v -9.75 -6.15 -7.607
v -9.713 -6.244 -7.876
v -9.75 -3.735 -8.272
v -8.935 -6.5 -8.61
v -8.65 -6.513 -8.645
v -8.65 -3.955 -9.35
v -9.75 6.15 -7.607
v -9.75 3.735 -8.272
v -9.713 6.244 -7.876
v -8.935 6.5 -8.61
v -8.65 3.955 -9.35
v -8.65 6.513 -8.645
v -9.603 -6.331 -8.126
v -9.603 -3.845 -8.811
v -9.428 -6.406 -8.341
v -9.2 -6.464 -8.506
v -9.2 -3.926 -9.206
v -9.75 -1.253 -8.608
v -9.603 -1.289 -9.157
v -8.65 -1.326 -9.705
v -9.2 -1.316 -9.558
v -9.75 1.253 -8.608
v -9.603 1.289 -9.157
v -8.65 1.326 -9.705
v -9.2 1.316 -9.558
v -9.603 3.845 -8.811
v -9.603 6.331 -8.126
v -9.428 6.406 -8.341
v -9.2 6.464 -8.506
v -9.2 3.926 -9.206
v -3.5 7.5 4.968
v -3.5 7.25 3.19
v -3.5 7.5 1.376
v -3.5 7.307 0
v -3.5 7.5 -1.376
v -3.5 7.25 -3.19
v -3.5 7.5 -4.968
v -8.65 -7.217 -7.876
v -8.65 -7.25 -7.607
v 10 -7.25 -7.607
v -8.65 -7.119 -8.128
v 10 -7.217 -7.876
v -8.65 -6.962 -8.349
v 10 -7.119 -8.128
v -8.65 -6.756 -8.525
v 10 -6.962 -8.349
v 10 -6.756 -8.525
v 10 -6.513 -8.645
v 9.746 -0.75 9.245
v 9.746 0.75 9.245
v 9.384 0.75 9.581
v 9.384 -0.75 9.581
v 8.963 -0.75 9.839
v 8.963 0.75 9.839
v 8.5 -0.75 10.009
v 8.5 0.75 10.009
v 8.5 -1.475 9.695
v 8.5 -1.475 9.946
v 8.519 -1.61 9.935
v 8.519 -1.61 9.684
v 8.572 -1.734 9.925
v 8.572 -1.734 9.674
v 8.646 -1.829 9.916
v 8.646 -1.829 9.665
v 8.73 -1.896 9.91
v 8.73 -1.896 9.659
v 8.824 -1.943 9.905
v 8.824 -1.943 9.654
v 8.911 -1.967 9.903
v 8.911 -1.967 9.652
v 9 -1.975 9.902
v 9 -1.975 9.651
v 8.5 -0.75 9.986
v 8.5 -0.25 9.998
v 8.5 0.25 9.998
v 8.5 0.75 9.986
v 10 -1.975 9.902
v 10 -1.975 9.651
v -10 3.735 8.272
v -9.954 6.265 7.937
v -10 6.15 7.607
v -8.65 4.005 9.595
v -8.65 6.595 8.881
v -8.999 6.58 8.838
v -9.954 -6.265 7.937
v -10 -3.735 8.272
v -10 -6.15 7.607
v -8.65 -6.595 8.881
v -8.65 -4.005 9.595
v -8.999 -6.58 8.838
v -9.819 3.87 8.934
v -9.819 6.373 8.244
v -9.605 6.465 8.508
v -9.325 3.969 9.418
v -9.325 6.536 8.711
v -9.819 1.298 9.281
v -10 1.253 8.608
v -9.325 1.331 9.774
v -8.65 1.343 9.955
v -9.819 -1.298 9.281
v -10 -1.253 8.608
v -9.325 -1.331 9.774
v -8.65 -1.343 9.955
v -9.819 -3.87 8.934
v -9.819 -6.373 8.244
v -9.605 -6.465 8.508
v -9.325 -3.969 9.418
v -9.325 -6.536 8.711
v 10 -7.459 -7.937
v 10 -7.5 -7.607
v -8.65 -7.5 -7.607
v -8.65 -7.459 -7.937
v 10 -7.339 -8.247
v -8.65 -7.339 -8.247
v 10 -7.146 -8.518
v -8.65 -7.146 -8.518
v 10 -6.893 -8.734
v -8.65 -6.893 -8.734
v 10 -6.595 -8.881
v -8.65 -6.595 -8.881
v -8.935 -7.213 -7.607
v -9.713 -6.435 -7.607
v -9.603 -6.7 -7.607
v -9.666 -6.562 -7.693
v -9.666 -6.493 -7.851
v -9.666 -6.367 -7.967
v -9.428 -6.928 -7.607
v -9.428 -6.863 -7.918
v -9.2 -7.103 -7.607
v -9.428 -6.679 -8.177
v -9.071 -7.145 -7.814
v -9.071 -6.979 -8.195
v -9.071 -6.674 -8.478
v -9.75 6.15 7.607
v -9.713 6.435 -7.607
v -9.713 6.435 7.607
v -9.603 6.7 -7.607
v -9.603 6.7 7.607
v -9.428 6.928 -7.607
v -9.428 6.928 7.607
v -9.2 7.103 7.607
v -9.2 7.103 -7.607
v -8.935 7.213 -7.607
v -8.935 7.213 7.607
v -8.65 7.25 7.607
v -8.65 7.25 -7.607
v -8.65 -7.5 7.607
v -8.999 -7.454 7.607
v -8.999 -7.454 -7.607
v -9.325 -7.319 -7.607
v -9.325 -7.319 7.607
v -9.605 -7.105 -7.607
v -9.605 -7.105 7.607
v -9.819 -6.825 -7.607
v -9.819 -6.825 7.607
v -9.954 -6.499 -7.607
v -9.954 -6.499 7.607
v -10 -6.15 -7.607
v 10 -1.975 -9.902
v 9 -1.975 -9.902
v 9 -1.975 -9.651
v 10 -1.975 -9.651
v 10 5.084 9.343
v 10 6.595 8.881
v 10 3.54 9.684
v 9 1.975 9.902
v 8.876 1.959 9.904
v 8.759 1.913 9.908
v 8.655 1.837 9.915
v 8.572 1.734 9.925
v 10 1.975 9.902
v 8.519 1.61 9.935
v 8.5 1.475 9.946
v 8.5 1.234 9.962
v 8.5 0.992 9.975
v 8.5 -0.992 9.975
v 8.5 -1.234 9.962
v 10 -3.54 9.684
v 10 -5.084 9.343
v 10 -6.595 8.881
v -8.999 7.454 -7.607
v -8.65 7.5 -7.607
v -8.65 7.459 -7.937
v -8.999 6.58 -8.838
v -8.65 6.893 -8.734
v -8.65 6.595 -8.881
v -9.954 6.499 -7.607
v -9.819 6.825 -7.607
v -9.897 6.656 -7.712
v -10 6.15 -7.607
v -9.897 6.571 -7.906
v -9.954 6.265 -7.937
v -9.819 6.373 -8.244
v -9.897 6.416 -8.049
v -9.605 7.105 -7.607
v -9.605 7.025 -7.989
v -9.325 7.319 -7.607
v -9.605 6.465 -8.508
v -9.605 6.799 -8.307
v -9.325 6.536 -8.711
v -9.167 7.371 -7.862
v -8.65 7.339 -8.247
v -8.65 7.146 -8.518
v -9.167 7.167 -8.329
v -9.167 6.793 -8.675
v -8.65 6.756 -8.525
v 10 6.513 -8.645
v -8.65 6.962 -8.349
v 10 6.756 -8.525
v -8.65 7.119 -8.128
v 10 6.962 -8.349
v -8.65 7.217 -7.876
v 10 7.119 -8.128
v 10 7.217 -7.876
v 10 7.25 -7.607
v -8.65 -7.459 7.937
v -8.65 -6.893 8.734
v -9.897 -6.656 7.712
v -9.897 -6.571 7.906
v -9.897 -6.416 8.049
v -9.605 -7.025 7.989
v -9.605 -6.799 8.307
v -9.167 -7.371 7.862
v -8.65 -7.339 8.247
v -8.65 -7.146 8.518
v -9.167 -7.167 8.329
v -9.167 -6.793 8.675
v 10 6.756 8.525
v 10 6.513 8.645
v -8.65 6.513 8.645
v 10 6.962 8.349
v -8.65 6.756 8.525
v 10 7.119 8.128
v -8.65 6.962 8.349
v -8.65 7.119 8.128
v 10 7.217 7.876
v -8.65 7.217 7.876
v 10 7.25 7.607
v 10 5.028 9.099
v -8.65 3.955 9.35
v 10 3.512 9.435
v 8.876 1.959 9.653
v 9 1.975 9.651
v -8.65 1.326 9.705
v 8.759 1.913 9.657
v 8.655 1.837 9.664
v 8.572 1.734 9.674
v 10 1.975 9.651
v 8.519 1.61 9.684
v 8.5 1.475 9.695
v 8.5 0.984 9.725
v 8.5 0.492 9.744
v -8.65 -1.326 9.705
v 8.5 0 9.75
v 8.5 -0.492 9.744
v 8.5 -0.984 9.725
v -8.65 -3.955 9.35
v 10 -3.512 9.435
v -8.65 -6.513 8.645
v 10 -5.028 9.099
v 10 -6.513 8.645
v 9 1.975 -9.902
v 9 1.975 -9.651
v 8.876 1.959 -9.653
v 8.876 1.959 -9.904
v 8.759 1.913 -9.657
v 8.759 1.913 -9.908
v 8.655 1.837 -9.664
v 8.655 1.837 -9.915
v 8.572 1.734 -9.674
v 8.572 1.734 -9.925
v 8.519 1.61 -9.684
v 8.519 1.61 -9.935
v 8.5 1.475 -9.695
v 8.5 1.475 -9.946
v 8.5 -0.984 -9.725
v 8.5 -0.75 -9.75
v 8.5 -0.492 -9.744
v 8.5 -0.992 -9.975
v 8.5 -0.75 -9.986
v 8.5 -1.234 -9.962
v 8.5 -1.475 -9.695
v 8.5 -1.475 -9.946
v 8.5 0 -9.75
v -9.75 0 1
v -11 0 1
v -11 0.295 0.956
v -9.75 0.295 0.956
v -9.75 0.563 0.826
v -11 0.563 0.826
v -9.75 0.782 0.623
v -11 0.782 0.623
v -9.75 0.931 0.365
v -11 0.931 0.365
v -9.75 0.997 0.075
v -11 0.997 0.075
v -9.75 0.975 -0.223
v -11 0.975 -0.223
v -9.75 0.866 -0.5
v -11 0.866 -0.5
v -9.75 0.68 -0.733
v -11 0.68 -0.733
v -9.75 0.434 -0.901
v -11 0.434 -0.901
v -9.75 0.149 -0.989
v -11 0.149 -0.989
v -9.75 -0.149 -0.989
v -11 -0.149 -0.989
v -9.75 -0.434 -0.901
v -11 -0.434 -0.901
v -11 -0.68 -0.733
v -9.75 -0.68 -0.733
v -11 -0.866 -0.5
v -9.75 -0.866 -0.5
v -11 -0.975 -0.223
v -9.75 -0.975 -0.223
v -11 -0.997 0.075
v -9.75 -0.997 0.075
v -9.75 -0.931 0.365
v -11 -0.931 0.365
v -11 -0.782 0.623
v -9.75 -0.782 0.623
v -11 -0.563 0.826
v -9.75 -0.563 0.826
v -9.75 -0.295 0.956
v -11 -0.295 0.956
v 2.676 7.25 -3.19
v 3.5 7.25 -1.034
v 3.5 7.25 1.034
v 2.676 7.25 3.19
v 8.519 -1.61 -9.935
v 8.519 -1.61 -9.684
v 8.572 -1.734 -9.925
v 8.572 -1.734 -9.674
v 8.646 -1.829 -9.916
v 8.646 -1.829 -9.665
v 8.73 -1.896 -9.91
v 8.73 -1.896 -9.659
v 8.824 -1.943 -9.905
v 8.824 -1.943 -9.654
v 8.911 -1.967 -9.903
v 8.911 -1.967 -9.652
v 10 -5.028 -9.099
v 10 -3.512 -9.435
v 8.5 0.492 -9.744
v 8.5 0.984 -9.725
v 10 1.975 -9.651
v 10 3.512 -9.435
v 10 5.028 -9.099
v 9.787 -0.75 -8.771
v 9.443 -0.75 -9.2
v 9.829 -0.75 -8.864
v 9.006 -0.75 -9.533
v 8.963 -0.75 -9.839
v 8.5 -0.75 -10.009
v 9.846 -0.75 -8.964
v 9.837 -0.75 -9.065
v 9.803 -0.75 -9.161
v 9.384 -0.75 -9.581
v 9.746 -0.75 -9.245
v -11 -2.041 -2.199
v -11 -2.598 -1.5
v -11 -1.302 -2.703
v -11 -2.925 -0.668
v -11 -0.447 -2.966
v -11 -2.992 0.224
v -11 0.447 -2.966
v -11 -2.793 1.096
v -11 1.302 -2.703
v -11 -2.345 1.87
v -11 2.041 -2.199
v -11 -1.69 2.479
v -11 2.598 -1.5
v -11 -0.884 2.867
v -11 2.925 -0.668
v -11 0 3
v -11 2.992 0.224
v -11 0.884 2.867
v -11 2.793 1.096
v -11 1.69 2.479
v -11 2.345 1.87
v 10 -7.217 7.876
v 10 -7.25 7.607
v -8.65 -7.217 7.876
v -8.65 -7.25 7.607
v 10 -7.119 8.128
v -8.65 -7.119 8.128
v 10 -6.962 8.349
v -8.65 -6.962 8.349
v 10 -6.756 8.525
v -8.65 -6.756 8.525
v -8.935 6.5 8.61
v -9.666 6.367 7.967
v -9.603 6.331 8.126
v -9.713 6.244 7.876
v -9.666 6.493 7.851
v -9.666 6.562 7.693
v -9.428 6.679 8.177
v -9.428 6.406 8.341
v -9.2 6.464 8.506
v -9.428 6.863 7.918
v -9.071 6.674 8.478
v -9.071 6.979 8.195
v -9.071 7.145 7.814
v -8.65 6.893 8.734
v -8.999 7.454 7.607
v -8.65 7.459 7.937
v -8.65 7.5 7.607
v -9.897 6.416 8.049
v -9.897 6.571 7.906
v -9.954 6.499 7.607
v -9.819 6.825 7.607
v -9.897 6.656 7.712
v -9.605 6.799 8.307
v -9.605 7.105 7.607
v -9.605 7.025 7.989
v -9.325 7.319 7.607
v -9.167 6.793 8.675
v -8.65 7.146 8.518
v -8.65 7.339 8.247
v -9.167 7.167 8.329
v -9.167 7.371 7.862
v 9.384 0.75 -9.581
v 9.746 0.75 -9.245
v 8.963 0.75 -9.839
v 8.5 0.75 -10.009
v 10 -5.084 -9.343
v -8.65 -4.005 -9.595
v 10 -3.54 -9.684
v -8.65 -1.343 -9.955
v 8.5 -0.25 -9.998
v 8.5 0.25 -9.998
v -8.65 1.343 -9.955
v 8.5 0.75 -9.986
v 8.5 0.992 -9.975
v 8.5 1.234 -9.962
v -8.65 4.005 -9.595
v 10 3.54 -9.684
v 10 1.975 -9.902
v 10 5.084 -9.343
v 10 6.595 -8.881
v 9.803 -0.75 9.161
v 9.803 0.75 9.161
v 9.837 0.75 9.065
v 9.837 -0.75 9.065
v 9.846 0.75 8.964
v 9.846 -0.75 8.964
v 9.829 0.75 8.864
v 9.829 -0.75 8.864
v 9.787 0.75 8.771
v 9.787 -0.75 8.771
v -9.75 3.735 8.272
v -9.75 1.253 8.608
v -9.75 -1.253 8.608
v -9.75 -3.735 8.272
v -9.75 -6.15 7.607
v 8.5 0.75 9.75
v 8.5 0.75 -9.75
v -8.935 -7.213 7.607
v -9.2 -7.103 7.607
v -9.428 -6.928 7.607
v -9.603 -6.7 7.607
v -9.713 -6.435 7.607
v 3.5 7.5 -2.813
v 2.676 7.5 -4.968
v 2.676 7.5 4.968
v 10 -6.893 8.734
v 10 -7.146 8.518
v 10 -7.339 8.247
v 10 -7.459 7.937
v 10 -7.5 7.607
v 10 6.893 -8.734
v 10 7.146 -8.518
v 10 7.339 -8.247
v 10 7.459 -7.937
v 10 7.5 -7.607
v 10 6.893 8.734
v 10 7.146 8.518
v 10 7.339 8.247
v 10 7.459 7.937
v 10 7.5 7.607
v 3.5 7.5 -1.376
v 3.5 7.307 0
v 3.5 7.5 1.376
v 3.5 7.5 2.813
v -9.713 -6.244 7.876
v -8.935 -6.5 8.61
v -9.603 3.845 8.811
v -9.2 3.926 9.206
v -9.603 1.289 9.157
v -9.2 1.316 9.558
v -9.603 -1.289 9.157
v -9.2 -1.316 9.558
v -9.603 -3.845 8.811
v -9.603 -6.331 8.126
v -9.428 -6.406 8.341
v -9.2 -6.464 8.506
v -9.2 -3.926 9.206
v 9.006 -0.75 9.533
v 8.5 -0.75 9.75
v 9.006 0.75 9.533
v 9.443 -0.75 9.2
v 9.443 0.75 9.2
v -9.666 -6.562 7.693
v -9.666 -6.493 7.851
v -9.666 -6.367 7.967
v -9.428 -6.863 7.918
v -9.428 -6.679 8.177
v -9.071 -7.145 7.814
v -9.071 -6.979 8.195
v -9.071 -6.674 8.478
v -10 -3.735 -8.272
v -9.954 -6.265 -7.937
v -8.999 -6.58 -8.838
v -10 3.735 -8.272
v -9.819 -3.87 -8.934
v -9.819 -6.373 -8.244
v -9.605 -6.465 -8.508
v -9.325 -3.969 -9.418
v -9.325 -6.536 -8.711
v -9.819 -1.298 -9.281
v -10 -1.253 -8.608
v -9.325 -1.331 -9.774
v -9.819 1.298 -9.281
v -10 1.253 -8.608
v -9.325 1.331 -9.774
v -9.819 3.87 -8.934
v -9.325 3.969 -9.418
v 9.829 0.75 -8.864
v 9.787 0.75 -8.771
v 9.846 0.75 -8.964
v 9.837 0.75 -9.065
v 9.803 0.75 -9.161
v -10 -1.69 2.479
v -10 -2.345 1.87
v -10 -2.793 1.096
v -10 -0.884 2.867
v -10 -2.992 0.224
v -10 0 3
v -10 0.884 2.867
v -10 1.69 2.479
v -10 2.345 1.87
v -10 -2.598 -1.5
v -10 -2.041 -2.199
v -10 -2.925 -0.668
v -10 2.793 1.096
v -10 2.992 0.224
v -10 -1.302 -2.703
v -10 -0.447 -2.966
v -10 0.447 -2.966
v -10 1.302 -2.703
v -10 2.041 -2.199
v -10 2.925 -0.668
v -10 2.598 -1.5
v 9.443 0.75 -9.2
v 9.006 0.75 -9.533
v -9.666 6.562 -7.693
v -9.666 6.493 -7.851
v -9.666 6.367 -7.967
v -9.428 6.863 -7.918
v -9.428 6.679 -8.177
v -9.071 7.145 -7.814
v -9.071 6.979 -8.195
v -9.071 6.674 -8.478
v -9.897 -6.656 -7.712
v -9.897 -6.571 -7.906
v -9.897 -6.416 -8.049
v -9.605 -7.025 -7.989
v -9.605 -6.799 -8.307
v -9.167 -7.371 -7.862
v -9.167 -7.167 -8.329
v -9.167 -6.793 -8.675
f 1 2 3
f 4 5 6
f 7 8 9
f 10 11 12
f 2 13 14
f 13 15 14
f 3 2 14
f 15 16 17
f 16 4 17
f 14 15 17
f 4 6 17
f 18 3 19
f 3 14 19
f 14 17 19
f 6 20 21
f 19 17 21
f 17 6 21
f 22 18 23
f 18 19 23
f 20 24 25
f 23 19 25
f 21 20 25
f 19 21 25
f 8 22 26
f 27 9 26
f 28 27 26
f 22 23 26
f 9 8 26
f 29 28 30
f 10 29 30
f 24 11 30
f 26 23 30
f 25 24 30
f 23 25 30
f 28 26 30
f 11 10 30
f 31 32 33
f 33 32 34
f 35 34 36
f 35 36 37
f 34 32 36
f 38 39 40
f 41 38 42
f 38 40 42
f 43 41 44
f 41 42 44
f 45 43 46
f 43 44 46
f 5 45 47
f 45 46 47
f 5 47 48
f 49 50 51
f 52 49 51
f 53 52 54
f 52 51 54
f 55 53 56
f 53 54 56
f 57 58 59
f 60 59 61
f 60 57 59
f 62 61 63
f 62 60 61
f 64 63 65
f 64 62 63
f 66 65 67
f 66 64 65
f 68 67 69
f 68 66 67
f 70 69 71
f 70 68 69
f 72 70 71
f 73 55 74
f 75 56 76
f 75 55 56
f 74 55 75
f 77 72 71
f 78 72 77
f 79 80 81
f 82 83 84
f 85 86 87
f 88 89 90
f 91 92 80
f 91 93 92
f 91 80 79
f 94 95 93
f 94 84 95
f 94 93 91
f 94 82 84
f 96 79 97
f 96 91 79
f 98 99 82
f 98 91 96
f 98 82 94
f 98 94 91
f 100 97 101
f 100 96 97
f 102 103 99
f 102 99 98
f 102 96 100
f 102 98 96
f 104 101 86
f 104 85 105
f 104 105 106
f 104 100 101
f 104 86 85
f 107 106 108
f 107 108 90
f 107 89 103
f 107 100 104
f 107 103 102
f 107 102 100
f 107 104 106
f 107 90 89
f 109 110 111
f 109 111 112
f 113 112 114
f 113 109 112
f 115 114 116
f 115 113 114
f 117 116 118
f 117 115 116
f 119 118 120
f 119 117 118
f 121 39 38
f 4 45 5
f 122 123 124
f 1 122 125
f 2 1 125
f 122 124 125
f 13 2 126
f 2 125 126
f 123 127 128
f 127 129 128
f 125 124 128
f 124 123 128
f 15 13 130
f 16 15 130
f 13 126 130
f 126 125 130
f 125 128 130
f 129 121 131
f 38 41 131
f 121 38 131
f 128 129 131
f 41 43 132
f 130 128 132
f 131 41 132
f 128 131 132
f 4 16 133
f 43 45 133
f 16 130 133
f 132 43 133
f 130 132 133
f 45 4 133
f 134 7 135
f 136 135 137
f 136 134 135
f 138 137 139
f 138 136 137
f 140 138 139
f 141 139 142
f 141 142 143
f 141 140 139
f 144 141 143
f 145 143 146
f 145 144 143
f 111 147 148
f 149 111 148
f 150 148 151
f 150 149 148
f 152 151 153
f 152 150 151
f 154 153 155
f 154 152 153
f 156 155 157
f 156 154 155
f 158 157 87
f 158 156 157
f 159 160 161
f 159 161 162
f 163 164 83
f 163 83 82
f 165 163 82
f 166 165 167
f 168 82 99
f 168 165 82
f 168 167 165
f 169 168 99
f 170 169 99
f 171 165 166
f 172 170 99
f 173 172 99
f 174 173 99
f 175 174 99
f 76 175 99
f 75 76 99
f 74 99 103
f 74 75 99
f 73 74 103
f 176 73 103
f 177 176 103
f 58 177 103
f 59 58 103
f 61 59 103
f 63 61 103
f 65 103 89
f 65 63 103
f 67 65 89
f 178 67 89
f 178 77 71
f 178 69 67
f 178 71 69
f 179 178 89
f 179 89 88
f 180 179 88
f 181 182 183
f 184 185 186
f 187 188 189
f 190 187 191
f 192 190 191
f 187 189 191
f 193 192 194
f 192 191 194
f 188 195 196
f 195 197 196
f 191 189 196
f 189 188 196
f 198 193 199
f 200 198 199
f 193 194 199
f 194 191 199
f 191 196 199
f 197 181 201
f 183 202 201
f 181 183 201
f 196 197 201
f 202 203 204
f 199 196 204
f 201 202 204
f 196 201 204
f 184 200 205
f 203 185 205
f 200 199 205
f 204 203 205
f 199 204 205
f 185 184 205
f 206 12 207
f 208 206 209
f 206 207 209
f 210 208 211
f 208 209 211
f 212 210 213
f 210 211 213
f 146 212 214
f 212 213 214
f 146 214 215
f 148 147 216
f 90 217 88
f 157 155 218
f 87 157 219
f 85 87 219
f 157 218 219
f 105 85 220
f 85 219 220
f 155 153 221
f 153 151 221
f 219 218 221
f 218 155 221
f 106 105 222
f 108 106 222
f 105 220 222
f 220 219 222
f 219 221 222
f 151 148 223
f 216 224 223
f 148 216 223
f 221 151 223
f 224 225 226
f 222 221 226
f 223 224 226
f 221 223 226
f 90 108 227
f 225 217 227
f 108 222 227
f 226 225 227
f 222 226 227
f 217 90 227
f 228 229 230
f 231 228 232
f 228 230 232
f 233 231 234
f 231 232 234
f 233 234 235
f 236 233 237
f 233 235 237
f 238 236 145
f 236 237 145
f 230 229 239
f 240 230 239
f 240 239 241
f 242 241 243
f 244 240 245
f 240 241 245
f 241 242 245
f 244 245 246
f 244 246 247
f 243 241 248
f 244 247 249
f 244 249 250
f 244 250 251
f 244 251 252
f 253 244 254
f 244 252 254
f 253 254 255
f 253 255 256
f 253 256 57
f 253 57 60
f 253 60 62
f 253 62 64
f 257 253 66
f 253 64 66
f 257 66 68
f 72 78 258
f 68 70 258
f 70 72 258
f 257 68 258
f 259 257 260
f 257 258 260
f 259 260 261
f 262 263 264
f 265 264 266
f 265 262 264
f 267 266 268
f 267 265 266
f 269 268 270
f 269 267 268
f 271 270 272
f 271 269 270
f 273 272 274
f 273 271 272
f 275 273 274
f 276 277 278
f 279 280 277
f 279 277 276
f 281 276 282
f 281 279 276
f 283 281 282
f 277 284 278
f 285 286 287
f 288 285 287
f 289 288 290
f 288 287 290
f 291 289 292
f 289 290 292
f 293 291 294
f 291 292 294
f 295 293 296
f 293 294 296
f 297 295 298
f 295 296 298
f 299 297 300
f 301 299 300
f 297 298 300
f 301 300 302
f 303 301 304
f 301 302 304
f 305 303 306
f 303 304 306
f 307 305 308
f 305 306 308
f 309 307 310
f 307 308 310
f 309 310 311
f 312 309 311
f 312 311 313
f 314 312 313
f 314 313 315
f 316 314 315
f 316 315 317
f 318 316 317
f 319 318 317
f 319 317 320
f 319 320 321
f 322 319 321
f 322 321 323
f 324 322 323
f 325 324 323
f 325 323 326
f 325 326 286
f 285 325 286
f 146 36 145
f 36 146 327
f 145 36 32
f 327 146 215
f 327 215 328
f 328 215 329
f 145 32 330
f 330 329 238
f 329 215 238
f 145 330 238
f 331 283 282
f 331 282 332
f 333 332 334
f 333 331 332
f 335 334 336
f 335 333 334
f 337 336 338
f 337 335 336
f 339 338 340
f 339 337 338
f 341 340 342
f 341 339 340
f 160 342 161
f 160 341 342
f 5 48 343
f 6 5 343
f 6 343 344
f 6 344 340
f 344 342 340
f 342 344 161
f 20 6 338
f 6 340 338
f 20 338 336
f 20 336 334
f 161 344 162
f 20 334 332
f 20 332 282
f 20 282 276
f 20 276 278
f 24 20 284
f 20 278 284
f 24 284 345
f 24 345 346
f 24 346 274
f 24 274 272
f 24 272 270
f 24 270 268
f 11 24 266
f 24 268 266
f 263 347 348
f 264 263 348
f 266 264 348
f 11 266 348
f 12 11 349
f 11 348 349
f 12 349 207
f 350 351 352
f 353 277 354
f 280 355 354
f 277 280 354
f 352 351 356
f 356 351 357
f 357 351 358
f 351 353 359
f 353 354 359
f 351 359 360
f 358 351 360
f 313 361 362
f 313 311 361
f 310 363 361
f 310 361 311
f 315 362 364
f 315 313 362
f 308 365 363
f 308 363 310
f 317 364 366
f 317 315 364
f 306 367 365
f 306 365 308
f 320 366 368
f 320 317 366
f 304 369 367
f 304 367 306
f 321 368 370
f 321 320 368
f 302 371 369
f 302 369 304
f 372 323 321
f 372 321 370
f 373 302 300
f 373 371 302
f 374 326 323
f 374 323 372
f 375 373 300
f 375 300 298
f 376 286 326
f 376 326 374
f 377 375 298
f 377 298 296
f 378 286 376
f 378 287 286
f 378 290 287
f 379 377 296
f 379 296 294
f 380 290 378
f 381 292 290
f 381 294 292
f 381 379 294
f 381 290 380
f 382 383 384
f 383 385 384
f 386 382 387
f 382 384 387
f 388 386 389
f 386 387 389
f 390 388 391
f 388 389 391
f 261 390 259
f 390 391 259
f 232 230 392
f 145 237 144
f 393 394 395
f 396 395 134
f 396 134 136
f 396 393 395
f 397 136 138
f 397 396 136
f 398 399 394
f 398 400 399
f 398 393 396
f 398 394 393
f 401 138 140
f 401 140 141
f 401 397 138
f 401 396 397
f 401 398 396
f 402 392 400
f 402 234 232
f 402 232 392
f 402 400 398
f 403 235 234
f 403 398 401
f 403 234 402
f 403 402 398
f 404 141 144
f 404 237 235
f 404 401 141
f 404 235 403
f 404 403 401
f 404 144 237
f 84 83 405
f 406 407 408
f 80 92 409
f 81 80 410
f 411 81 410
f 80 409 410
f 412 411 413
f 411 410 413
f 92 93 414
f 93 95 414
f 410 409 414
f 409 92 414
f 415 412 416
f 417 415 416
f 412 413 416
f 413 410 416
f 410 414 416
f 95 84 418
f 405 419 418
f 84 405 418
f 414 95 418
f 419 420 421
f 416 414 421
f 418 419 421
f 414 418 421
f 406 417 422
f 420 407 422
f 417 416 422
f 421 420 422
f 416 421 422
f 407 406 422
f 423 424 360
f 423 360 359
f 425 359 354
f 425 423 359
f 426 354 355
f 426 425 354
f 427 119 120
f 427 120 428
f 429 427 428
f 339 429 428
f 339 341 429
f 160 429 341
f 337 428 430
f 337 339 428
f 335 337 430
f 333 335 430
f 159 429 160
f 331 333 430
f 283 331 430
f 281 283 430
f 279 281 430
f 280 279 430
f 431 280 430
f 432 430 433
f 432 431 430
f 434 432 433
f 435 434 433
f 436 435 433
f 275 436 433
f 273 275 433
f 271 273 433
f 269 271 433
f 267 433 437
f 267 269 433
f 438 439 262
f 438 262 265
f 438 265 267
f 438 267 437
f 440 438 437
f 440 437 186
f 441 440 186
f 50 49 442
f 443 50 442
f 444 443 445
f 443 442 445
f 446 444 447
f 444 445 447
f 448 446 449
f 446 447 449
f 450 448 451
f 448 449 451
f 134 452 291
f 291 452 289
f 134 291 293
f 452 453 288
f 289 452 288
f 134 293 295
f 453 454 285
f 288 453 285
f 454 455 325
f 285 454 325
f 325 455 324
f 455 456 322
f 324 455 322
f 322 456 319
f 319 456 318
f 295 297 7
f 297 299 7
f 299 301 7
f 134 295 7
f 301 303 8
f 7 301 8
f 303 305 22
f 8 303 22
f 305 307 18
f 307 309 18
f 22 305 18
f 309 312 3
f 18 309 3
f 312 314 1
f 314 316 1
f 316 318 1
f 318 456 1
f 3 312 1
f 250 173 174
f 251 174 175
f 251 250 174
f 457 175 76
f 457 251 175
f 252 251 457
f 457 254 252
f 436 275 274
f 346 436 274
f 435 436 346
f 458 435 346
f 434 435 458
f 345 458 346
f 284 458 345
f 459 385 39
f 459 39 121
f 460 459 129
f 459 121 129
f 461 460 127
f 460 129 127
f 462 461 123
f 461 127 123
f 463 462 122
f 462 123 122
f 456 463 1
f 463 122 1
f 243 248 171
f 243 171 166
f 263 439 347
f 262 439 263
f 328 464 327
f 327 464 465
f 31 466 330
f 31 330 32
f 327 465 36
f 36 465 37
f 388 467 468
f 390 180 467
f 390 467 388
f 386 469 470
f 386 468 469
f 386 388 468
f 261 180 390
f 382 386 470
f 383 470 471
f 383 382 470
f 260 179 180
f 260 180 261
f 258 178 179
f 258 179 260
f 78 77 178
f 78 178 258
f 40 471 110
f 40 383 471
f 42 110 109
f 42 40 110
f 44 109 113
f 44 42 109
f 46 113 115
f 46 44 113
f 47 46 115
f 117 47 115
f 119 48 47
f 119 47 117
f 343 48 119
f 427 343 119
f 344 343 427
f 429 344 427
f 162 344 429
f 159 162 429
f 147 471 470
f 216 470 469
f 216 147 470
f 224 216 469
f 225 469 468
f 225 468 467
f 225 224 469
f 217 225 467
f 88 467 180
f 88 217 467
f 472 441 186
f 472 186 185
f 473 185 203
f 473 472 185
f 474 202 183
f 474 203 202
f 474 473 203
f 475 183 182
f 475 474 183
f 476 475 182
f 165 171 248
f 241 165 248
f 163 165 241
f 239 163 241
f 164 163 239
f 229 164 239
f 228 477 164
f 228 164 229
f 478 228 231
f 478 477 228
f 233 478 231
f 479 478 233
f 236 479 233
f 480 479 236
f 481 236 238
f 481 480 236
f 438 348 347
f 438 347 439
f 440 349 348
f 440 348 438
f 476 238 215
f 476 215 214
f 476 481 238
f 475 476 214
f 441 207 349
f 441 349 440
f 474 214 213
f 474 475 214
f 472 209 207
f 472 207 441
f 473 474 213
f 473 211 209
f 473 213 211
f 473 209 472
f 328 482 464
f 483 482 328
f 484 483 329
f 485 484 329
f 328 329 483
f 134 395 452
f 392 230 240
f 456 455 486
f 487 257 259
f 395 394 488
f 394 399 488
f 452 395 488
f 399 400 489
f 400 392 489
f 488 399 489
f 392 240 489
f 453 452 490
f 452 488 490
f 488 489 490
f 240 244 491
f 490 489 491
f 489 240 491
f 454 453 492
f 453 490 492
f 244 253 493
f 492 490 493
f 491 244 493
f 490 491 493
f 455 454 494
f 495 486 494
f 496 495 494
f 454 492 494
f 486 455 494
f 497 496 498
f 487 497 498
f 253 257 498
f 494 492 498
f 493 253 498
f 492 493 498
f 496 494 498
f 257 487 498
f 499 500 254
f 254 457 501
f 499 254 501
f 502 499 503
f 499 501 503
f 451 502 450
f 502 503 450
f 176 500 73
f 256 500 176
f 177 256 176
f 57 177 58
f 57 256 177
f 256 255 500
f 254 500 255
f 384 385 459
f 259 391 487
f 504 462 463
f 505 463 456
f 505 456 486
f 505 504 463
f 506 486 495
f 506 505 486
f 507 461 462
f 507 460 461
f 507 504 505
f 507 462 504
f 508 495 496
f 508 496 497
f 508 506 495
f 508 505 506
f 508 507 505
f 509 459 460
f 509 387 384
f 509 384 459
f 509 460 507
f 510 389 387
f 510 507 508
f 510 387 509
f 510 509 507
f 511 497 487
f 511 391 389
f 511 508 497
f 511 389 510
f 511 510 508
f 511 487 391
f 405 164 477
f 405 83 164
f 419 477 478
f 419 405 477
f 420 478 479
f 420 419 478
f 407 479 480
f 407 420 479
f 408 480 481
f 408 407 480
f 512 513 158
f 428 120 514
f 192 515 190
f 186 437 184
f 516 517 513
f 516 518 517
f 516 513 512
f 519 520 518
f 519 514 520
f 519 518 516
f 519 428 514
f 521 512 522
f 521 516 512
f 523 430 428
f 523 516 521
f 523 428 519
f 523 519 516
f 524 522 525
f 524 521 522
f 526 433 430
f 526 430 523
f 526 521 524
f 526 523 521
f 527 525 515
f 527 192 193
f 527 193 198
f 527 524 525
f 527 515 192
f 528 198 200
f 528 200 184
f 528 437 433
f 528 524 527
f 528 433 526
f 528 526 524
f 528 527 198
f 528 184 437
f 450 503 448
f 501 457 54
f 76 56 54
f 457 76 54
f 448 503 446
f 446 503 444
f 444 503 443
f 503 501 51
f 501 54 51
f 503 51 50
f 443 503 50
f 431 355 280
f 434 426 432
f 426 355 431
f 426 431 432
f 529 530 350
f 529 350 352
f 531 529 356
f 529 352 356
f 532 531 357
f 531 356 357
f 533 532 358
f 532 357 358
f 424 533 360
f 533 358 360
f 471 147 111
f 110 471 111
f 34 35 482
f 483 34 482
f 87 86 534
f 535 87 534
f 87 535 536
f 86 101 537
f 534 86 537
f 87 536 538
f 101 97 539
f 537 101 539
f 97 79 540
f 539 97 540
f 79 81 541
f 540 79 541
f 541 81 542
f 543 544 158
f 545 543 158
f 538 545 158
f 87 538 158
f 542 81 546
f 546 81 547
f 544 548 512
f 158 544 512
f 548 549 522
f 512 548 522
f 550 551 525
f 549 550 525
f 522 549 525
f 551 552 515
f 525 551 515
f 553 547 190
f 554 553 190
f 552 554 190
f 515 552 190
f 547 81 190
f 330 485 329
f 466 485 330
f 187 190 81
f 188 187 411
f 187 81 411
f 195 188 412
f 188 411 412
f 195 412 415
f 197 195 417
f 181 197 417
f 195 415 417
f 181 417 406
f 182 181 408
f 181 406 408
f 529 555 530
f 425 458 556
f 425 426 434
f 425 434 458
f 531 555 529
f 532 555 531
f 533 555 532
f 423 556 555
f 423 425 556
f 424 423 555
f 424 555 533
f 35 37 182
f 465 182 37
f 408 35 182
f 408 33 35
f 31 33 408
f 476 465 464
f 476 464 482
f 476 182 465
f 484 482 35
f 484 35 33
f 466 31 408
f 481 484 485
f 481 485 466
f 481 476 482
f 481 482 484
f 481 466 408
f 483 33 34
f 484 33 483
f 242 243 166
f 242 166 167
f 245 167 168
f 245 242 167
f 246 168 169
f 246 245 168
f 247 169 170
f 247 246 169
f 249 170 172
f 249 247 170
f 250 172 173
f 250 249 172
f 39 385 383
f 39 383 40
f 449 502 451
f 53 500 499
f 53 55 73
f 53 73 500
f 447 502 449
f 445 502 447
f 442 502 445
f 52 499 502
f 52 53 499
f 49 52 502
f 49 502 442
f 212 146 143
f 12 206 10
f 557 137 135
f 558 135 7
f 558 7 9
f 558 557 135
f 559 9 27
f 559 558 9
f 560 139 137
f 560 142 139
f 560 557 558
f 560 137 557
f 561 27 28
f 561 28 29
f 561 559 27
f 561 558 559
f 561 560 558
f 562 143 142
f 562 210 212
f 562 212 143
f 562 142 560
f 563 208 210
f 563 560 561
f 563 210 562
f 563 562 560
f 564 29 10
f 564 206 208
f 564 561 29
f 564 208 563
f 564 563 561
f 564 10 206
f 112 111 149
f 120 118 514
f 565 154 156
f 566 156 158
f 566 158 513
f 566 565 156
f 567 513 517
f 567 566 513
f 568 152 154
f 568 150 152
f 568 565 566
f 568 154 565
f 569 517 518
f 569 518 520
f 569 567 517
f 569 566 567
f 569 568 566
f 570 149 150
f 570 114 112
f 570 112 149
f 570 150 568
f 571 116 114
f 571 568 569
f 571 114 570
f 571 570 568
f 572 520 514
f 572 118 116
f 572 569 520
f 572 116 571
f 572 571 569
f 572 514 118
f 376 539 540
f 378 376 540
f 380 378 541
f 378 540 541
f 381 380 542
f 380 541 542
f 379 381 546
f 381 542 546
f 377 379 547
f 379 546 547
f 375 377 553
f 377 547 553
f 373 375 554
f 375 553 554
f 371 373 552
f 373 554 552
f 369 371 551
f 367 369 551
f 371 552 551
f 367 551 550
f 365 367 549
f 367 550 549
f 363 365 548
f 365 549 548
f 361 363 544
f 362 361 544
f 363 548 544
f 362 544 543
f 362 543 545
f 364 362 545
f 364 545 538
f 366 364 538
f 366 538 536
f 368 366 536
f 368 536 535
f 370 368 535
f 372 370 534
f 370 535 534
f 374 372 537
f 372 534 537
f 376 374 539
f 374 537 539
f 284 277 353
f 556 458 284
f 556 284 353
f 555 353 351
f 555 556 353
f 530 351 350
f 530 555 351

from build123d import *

# Parameters (mm, degrees)
BOSS_EXTRUDE1_DEPTH       = 10
SKETCH2_R                 = 3
BOSS_EXTRUDE3_DEPTH       = 1
FILLET2_R                 = 1.35
SHELL6_T                  = -0.25
SHELL6_THICKNESS_2_FACE_R = 2.75
SHELL6_THICKNESS_2_DEPTH  = 1
SKETCH3_R                 = 1
CUT_EXTRUDE2_DEPTH        = 25.438698861
CUT_EXTRUDE6_DEPTH        = 10
CUT_EXTRUDE9_DEPTH        = 17.650825865
CUT_EXTRUDE9_DEPTH_BACK   = 17.650825865
BOSS_EXTRUDE4_DEPTH       = 0.75
FILLET3_R                 = 0.4
FILLET3_OF_MIRROR2_R      = 0.4


with BuildPart() as part:
    # Sketch1 → Boss-Extrude1 (new, symmetric)
    with BuildSketch(Plane(origin=(0, 0, 0), x_dir=(0, 0, -1), z_dir=(1, 0, 0))):
        with BuildLine():
            Line((-8.540496218, -7.5), (8.540496218, -7.5))
            ThreePointArc((8.540496218, -7.5), (10, 0), (8.540496218, 7.5))
            Line((8.540496218, 7.5), (-8.540496218, 7.5))
            ThreePointArc((-8.540496218, 7.5), (-10, 0), (-8.540496218, -7.5))
        make_face()
    extrude(amount=BOSS_EXTRUDE1_DEPTH, both=True)

    # Sketch2 → Boss-Extrude3 (add)
    with BuildSketch(Plane.ZY.offset(10)):
        Circle(SKETCH2_R)
    extrude(amount=BOSS_EXTRUDE3_DEPTH)

    # Fillet2
    fillet2_edges = [part.edges().sort_by_distance(p)[0] for p in [
        (-10, -7.5, 0),
        (-10, 0, 10),
        (-10, 7.5, 0),
        (-10, 0, -10),
        (0, -7.5, -8.540496218),
        (0, -7.5, 8.540496218),
        (0, 7.5, 8.540496218),
        (0, 7.5, -8.540496218),
    ]]
    fillet(fillet2_edges, radius=FILLET2_R)

    # Shell6
    shell6_openings = [part.faces().sort_by_distance(p)[0] for p in [
        (10, 0, 0),
    ]]
    offset(amount=SHELL6_T, openings=shell6_openings, kind=Kind.INTERSECTION)

    # Shell6 thickness 2 face (on inner face of the shell) → Shell6 thickness 2 (add)
    with BuildSketch(Plane(origin=(-10.75, 0, 0), x_dir=(0, 0, -1), z_dir=(-1, 0, 0))):
        Circle(SHELL6_THICKNESS_2_FACE_R)
    extrude(amount=-SHELL6_THICKNESS_2_DEPTH)

    # Sketch3 → Cut-Extrude2 (cut, through all)
    with BuildSketch(Plane.ZY.offset(11)):
        Circle(SKETCH3_R)
    extrude(amount=-CUT_EXTRUDE2_DEPTH, mode=Mode.SUBTRACT)

    # Sketch8 → Cut-Extrude6 (cut)
    with BuildSketch(Plane(origin=(0, 1.317628396, 9.375413194), x_dir=(-1, 0, 0), z_dir=(0, -0.13917310096005872, -0.9902680687415713))):
        Polygon((3.5, 6.735543413), (3.5, 7.235543413), (-3.5, 7.235543413), (-3.5, 7.035543413), (-2.675756774, 6.735543413), align=None)
    cut_extrude6 = extrude(amount=CUT_EXTRUDE6_DEPTH, mode=Mode.SUBTRACT)

    # Mirror1: Cut-Extrude6 across plane
    add(cut_extrude6.mirror(Plane.XY), mode=Mode.SUBTRACT)

    # Sketch9 → Cut-Extrude9 (cut, two sides: drawn at the far end of the back side and taken through both)
    with BuildSketch(Plane.XY.offset(-CUT_EXTRUDE9_DEPTH_BACK)):
        with BuildLine():
            Line((10, 1.975), (9, 1.975))
            ThreePointArc((9, 1.975), (8.646446609, 1.828553391), (8.5, 1.475))
            Line((8.5, 1.475), (8.5, -1.475))
            ThreePointArc((8.5, -1.475), (8.646446609, -1.828553391), (9, -1.975))
            Line((9, -1.975), (10, -1.975))
            Line((10, -1.975), (10, 1.975))
        make_face()
    extrude(amount=CUT_EXTRUDE9_DEPTH + CUT_EXTRUDE9_DEPTH_BACK, mode=Mode.SUBTRACT)

    # Sketch10 → Boss-Extrude4 (add, symmetric)
    with BuildSketch(Plane(origin=(0, 0, 0), x_dir=(1, 0, 0), z_dir=(0, 1, 0))):
        with BuildLine():
            Line((9.787254425, 8.770946884), (10, 8.902245476))
            ThreePointArc((10, 8.902245476), (9.357045131, 9.600790595), (8.5, 10.009238743))
            Line((8.5, 10.009238743), (8.5, 9.75))
            ThreePointArc((8.5, 9.75), (9.234633876, 9.380128574), (9.787254425, 8.770946884))
        make_face()
    boss_extrude4 = extrude(amount=BOSS_EXTRUDE4_DEPTH, both=True)

    # Fillet3
    # the kernel refuses this fillet: 0.4 mm, written as the material it takes off along each edge
    with BuildSketch(Plane(origin=(10, -1.816179824, -8.902245476), x_dir=(-0.5958644657963694, 0, -0.8030850131842876), z_dir=(0, 1, 0))) as fillet3_piece_1:
        with BuildLine():
            CenterArc((0.392354175, 0.398542317), FILLET3_R, 201.939875172, 72.953078249)
            Line((0.021323596, 0.249088948), (0.013902985, 0.246099881))
            ThreePointArc((0.013902985, 0.246099881), (0.002690952, 0.125226829), (-0.007970846, 0.000682355))
            Line((-0.007970846, 0.000682355), (-0.000682355, -0.007970846))
            ThreePointArc((-0.000682355, -0.007970846), (0.213235965, -0.017110516), (0.427154285, -0.007970846))
            Line((0.427154285, -0.007970846), (0.42647193, 0))
        make_face()
    extrude(amount=3.632359649, mode=Mode.SUBTRACT)

    # Mirror2: Boss-Extrude4 across plane
    add(boss_extrude4.mirror(Plane.XY))

    # Fillet3 of Mirror2
    # the kernel refuses this fillet: 0.4 mm, written as the material it takes off along each edge
    with BuildSketch(Plane(origin=(10, -1.816179824, 8.902245476), x_dir=(-0.5958644657963694, 0, 0.8030850131842876), z_dir=(0, 1, 0))) as fillet3_of_mirror2_piece_1:
        with BuildLine():
            CenterArc((0.392354175, -0.398542317), FILLET3_OF_MIRROR2_R, 85.10704658, 72.953078249)
            Line((0.021323596, -0.249088948), (0.013902985, -0.246099881))
            ThreePointArc((0.013902985, -0.246099881), (0.002690952, -0.125226829), (-0.007970846, -0.000682355))
            Line((-0.007970846, -0.000682355), (-0.000682355, 0.007970846))
            ThreePointArc((-0.000682355, 0.007970846), (0.213235965, 0.017110516), (0.427154285, 0.007970846))
            Line((0.427154285, 0.007970846), (0.42647193, 0))
        make_face()
    extrude(amount=3.632359649, mode=Mode.SUBTRACT)


solid = part.part
